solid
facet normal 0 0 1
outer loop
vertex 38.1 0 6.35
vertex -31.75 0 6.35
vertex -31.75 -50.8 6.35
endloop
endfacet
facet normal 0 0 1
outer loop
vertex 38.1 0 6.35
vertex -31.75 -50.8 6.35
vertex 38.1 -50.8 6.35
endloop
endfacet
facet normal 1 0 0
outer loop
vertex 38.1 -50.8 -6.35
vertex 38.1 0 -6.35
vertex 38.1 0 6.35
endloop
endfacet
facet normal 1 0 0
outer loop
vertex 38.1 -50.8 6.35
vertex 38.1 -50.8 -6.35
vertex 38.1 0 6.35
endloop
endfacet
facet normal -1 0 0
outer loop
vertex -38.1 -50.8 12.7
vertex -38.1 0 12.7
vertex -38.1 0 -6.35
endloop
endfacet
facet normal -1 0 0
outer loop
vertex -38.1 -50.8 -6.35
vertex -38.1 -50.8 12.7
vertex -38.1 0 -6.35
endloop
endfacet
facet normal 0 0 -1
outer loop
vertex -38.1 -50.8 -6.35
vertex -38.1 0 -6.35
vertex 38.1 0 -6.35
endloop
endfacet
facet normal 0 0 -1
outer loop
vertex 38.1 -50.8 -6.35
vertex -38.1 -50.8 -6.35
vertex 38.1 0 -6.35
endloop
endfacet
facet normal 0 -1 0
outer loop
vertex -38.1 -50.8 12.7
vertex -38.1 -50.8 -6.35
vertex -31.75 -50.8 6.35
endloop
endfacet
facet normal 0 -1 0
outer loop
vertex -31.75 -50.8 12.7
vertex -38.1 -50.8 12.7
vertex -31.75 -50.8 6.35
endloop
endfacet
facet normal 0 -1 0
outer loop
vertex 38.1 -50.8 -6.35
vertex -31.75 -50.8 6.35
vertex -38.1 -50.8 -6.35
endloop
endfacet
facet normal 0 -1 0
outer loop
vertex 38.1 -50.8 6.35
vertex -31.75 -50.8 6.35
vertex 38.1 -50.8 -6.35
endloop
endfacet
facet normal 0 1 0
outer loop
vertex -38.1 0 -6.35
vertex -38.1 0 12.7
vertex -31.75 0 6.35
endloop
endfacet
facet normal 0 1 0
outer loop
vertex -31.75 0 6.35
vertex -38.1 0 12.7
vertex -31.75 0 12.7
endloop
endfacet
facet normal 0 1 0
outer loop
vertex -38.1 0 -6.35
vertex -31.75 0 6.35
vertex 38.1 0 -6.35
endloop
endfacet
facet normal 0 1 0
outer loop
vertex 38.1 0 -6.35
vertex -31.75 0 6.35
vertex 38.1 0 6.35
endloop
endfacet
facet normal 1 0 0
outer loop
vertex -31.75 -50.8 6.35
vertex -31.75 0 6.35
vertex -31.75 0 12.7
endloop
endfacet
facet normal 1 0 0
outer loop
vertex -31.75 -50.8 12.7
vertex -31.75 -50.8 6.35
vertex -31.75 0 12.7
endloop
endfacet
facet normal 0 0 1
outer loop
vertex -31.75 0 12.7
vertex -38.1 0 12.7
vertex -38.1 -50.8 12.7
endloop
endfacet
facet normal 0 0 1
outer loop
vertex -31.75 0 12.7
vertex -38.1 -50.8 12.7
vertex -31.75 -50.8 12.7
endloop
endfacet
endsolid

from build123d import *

# Parameters (mm, degrees)
F0_W     = 6.35
F0_H     = 12.7
F0_H_2   = 6.35
F0_W_2   = 69.85
F1_DEPTH = 25.4
F2_DEPTH = 25.4


with BuildPart() as f1:
    # F0 (on Front) → F1 (new body)
    with BuildSketch(Plane.XZ):
        with Locations((-34.925, 0)):
            Rectangle(F0_W, F0_H)
        with Locations((-34.925, 9.525)):
            Rectangle(F0_W, F0_H_2)
        with Locations((3.175, 0)):
            Rectangle(F0_W_2, F0_H)
    extrude(amount=F1_DEPTH)

    # F0 (on Front) + F1_face (on face) → F2 (join)
    with BuildSketch(Plane.XZ):
        with Locations((-34.925, 9.525)):
            Rectangle(F0_W, F0_H_2)
        with Locations((-34.925, 0)):
            Rectangle(F0_W, F0_H)
        with Locations((3.175, 0)):
            Rectangle(F0_W_2, F0_H)
    with BuildSketch(Plane(origin=(-1.397, -25.4, 0.381), x_dir=(1, 0, 0), z_dir=(0, -1, 0))):
        Polygon((-36.703, 12.319), (-36.703, -6.731), (39.497, -6.731), (39.497, 5.969), (-30.353, 5.969), (-30.353, 12.319), align=None)
    extrude(amount=F2_DEPTH)


solid = f1.part
